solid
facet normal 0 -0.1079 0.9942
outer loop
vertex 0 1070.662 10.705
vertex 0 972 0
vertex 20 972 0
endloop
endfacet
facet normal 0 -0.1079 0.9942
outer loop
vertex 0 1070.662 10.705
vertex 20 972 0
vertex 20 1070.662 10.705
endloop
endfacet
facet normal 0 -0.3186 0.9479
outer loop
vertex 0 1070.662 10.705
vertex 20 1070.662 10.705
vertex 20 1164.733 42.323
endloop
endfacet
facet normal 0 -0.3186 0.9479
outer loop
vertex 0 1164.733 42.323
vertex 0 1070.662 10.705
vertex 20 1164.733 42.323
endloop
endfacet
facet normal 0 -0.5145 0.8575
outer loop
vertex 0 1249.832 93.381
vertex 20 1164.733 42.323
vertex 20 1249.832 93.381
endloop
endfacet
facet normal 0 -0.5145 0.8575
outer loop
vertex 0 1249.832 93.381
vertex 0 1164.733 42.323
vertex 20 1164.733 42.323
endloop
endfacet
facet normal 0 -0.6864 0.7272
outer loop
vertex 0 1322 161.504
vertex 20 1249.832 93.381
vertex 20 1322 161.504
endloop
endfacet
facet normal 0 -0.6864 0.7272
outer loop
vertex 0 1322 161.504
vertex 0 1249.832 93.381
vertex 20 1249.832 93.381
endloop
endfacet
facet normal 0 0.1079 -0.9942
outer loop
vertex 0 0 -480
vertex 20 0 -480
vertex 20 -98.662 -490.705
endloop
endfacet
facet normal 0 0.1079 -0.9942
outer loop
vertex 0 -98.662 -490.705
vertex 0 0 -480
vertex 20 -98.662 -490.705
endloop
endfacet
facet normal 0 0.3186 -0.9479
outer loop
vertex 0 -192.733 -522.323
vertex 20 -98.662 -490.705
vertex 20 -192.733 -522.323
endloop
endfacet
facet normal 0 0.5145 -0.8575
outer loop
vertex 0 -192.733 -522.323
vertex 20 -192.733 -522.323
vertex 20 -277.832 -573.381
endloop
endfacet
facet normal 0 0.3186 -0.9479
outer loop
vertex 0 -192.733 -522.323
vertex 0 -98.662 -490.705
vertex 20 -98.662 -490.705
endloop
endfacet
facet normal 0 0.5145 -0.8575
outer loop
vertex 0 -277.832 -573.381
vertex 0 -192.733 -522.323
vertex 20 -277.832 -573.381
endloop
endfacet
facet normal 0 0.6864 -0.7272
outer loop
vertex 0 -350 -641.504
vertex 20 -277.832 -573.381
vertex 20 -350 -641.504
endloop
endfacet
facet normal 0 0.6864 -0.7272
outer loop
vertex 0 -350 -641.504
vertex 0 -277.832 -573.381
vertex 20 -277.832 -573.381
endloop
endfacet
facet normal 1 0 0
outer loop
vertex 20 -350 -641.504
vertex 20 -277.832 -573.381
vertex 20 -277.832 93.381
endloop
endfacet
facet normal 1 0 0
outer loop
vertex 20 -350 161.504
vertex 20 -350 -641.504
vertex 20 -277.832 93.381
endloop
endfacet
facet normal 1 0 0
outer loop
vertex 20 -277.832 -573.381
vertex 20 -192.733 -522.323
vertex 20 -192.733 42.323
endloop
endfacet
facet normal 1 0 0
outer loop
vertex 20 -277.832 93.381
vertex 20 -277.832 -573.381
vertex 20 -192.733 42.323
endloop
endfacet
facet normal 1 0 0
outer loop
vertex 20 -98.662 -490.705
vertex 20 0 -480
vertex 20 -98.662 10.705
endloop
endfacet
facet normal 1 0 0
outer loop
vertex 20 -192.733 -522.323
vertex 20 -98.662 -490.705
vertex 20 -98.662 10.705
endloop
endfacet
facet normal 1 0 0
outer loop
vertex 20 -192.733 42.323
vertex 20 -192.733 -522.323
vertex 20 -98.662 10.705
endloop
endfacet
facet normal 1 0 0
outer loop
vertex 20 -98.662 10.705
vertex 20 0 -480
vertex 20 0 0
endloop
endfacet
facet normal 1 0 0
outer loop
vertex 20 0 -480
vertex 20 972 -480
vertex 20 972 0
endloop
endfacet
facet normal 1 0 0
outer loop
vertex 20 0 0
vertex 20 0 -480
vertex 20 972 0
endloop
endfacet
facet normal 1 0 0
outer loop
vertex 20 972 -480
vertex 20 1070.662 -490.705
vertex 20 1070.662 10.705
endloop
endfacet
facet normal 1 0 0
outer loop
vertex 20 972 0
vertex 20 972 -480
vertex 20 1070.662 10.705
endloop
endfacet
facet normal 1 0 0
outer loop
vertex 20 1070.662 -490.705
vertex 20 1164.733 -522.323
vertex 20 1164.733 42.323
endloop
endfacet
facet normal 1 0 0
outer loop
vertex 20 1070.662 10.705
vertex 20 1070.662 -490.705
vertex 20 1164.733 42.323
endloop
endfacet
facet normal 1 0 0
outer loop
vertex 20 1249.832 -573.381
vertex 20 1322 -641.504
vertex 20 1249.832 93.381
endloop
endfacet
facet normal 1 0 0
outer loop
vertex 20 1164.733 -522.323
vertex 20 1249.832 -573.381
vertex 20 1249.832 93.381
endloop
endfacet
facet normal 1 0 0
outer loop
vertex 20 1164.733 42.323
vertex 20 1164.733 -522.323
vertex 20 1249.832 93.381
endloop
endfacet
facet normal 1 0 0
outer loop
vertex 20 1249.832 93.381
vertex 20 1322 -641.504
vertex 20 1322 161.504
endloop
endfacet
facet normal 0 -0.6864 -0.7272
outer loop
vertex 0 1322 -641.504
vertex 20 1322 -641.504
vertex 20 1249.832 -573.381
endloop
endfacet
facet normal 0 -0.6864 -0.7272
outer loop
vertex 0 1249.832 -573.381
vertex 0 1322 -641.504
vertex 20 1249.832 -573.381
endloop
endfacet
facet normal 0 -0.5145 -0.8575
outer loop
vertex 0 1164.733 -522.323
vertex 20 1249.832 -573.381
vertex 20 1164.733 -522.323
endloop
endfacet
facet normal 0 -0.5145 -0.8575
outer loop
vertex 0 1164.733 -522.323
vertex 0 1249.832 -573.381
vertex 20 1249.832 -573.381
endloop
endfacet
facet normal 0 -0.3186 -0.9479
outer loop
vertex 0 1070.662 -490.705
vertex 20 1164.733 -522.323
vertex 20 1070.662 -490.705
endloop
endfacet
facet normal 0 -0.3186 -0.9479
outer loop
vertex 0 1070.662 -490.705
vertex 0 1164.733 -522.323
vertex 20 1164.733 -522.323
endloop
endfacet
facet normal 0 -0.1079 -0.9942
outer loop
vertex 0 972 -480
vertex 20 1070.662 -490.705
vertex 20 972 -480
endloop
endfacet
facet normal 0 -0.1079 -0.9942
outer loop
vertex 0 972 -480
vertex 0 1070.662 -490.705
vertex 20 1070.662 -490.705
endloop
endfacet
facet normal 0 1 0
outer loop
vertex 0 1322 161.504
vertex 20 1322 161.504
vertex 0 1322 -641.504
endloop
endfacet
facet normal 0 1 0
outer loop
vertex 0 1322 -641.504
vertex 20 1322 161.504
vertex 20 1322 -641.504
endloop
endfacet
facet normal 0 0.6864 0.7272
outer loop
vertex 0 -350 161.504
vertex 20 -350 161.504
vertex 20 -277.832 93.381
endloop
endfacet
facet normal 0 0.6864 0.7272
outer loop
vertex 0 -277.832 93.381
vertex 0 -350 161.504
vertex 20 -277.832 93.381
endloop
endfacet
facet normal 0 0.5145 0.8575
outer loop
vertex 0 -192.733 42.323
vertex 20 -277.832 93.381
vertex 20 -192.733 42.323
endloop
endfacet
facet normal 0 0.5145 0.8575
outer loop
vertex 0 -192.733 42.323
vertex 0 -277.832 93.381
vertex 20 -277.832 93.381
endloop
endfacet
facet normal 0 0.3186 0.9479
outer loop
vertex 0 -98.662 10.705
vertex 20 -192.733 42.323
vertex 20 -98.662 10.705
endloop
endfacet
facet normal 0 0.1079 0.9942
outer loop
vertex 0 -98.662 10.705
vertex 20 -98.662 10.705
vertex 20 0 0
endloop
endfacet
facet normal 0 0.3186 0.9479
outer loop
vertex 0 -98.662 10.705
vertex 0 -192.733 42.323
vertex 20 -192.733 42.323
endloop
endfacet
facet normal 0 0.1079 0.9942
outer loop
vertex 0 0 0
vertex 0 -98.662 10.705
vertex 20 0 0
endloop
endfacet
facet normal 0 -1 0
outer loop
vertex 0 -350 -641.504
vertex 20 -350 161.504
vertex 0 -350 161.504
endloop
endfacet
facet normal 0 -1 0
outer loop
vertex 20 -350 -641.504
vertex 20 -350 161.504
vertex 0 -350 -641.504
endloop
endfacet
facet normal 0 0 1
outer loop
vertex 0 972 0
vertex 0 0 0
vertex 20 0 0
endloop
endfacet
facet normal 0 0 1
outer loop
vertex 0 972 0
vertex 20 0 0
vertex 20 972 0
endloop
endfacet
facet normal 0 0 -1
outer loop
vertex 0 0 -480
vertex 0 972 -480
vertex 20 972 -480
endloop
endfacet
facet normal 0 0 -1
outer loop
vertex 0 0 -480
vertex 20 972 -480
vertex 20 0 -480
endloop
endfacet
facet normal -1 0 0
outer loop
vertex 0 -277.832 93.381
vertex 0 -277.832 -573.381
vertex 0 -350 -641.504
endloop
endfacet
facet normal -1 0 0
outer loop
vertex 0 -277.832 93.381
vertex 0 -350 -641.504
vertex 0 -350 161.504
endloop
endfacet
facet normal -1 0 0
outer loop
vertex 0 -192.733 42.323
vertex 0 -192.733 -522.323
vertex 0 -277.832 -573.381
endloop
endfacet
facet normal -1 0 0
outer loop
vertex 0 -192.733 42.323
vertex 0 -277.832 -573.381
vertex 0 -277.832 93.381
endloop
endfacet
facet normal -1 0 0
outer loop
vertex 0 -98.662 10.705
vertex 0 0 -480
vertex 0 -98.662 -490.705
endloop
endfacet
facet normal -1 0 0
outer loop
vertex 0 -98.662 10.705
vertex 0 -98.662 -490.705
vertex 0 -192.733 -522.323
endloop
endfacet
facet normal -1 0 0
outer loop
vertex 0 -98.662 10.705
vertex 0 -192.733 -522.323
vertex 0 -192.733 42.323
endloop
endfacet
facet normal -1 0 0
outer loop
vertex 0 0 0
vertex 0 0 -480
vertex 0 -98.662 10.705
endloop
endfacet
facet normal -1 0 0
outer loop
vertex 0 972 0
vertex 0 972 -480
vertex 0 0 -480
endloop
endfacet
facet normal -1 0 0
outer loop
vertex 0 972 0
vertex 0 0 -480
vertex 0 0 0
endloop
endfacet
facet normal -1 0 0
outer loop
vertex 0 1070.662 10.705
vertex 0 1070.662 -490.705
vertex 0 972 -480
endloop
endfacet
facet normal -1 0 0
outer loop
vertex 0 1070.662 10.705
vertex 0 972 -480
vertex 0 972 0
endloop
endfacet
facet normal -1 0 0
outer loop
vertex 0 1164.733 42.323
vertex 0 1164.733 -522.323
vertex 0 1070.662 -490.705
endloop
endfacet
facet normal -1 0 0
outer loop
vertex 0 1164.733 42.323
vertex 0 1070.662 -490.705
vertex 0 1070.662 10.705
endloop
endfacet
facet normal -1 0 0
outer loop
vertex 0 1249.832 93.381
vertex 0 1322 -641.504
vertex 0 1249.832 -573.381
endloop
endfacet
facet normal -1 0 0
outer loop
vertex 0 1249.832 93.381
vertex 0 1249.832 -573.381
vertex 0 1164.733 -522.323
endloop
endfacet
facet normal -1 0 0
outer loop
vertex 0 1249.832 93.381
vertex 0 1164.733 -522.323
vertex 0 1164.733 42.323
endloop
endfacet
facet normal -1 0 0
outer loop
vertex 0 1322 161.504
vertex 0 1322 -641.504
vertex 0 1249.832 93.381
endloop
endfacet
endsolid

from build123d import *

# Parameters (mm, degrees)
BOSS_EXTRUDE1_DEPTH = 20
CUT_EXTRUDE1_DEPTH  = 20


with BuildPart() as part:
    # Sketch1 → Boss-Extrude1 (new body)
    with BuildSketch(Plane(origin=(0, 0, 0), x_dir=(0, 0, -1), z_dir=(1, 0, 0))):
        with BuildLine():
            Line((0, 0), (0, 972))
            ThreePointArc((0, 972), (-134.730880654, 1297.269119346), (-460, 1432))
            Line((-460, 1432), (940, 1432))
            ThreePointArc((940, 1432), (614.730880654, 1297.269119346), (480, 972))
            Line((480, 972), (480, 0))
            ThreePointArc((480, 0), (614.730880654, -325.269119346), (940, -460))
            Line((940, -460), (-460, -460))
            ThreePointArc((-460, -460), (-134.730880654, -325.269119346), (0, 0))
        make_face()
    extrude(amount=BOSS_EXTRUDE1_DEPTH)

    # Sketch2 → Cut-Extrude1 (cut)
    with BuildSketch(Plane(origin=(20, 0, 0), x_dir=(0, 0, -1), z_dir=(1, 0, 0))):
        Polygon((-460, 1322), (1004.695967819, 1322), (1004.695967819, 1530.227687148), (-489.352876869, 1530.227687148), align=None)
        Polygon((1004.695967819, -350), (1004.695967819, -558.227687148), (-489.352876869, -558.227687148), (-460, -350), align=None)
    extrude(amount=-CUT_EXTRUDE1_DEPTH, mode=Mode.SUBTRACT)


solid = part.part
